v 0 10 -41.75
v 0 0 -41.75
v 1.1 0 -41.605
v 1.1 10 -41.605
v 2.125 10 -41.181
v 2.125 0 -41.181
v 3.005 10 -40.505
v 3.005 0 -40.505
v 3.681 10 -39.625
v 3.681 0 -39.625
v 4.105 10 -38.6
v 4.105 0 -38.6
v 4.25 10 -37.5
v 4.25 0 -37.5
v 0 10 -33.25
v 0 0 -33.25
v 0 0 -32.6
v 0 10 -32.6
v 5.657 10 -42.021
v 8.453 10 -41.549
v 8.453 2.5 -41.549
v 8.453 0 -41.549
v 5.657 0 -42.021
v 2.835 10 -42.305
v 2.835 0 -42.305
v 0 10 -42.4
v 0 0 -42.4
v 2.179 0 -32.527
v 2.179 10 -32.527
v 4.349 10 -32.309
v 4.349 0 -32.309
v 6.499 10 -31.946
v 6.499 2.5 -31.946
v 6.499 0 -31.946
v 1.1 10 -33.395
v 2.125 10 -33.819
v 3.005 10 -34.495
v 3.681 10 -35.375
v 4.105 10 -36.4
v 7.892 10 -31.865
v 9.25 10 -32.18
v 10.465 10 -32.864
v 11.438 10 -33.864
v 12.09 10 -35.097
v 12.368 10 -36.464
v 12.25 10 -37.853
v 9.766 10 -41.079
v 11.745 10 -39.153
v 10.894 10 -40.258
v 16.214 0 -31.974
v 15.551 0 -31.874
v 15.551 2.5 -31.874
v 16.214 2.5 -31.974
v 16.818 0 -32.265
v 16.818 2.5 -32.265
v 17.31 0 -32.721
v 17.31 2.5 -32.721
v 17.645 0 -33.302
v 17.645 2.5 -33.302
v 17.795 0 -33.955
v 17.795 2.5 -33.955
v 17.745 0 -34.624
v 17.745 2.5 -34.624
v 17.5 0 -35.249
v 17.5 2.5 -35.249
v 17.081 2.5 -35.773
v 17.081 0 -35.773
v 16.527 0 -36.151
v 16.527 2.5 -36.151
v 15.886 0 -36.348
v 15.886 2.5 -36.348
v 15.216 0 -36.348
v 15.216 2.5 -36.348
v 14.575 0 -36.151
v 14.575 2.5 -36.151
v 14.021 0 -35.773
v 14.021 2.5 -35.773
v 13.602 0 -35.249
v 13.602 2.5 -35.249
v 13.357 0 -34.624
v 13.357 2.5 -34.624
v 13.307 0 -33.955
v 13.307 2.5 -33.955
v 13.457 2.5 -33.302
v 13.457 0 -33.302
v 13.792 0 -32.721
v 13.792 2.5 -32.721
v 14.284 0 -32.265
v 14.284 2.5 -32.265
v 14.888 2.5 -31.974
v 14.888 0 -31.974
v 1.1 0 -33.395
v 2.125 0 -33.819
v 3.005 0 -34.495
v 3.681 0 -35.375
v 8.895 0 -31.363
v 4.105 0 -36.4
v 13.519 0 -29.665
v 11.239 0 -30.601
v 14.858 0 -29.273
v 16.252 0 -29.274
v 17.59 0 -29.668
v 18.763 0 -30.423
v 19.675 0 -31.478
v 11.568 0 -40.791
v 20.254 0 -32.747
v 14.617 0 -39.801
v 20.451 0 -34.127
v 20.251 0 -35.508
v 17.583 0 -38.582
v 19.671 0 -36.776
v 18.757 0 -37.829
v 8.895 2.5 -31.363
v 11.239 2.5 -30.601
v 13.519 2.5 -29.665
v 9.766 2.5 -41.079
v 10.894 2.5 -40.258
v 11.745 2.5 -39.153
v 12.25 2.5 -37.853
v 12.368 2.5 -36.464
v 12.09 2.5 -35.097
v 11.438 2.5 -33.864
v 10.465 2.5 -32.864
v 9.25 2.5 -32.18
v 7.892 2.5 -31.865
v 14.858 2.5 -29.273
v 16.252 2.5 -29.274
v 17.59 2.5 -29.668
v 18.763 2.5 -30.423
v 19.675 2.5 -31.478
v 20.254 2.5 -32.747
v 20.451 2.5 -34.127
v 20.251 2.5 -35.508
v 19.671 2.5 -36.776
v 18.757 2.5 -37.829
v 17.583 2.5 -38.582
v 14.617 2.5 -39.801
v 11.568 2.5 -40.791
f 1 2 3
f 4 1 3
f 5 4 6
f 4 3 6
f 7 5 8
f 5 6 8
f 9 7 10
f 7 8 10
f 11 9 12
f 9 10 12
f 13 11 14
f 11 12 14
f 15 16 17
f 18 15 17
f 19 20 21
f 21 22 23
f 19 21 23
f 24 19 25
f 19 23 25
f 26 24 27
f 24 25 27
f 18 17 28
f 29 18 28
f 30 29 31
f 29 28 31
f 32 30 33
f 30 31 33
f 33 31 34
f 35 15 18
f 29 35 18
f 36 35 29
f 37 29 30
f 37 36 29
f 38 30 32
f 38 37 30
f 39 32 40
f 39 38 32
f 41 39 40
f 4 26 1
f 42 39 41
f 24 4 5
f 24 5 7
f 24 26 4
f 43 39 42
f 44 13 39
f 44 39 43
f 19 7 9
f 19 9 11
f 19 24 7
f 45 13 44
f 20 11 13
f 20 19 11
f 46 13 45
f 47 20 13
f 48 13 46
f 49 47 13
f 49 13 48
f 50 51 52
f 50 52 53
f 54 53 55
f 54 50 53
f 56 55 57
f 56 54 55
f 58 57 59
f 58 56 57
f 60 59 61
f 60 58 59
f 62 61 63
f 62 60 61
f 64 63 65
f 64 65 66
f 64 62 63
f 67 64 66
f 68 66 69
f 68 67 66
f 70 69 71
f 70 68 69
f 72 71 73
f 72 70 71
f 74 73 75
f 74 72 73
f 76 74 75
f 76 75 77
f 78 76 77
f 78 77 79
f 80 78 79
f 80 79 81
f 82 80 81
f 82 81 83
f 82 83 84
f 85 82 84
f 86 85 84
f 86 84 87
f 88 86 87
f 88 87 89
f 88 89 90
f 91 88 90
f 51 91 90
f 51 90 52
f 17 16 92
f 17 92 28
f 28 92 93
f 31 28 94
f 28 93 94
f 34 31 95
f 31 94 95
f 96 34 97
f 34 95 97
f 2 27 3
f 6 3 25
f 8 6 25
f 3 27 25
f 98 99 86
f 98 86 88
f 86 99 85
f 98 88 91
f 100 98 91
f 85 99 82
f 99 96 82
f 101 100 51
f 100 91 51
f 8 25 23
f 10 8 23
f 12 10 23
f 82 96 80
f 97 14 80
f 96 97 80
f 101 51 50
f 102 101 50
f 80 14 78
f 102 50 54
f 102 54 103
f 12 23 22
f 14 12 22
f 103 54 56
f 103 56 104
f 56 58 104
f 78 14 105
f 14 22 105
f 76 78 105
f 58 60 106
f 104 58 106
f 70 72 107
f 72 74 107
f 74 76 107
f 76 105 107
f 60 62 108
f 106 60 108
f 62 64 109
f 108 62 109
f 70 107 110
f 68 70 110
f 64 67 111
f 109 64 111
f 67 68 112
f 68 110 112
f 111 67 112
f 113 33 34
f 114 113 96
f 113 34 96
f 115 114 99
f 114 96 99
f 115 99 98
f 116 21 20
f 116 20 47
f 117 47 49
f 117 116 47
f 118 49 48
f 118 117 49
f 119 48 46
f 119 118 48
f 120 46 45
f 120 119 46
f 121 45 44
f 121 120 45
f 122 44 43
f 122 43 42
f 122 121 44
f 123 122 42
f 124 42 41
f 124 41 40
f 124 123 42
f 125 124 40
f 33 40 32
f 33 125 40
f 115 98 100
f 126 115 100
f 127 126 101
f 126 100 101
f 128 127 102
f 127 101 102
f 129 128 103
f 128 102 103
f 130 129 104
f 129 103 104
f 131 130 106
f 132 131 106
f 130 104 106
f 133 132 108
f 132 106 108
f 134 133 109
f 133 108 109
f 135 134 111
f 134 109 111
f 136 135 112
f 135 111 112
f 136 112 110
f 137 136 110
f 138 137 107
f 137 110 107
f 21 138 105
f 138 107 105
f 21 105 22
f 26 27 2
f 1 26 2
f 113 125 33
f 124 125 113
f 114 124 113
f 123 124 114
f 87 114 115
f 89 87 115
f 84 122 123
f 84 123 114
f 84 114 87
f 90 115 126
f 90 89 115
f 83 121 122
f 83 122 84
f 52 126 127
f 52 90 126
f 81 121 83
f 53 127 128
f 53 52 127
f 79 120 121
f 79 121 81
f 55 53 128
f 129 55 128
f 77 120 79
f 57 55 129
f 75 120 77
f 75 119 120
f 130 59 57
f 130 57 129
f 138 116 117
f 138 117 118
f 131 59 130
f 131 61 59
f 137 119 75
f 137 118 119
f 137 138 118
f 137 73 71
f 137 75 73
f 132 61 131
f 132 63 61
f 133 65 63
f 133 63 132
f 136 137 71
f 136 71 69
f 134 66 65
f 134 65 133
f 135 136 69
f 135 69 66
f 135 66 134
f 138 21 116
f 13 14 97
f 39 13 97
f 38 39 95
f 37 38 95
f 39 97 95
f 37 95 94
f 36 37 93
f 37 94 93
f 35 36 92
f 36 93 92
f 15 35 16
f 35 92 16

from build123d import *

# Parameters (mm, degrees)
SKETCH_1_R          = 4.9
SKETCH_1_R_2        = 2.25
EXTRUDE_1_DEPTH     = 10
CUT_EXTRUDE_START   = -7.5
SKETCH_2_R          = 2.25
CUT_EXTRUDE_1_DEPTH = 7.5


with BuildPart() as part:
    # ｽｹｯﾁ1 → ﾎﾞｽ - 押し出し1 (new body)
    # profile 1 of 3: a face of its own
    with BuildSketch(Plane(origin=(0, 0, 0), x_dir=(1, 0, 0), z_dir=(0, 1, 0))):
        with BuildLine():
            Line((8.453200419, 41.548807476), (6.499394662, 31.945545371))
            ThreePointArc((6.499394662, 31.945545371), (10.073954086, 31.004442409), (13.518999843, 29.66473737))
            ThreePointArc((13.518999843, 29.66473737), (11.092186389, 36.155544584), (17.582993695, 38.582357791))
            ThreePointArc((17.582993695, 38.582357791), (13.102320669, 40.324796256), (8.453200419, 41.548807476))
        make_face()
    # profile 2 of 3: a face of its own
    with BuildSketch(Plane(origin=(0, 0, 0), x_dir=(1, 0, 0), z_dir=(0, 1, 0))):
        with Locations((15.5509966, 34.123547658)):
            Circle(SKETCH_1_R)
        with Locations(Location((15.5509966, 34.123547658, 0), (0, 0, 270))):
            Circle(SKETCH_1_R_2, mode=Mode.SUBTRACT)
    # profile 3 of 3: a face of its own
    with BuildSketch(Plane(origin=(0, 0, 0), x_dir=(1, 0, 0), z_dir=(0, 1, 0))):
        with BuildLine():
            Line((0, 33.25), (0, 32.6))
            ThreePointArc((0, 32.6), (3.266130809, 32.435973695), (6.499394662, 31.945545371))
            Line((6.499394662, 31.945545371), (8.453200419, 41.548807476))
            ThreePointArc((8.453200419, 41.548807476), (4.247973812, 42.186665174), (0, 42.4))
            Line((0, 42.4), (0, 41.75))
            ThreePointArc((0, 41.75), (3.00520382, 40.50520382), (4.25, 37.5))
            ThreePointArc((4.25, 37.5), (3.00520382, 34.49479618), (0, 33.25))
        make_face()
    extrude(amount=EXTRUDE_1_DEPTH)

    # ｽｹｯﾁ2 → ｶｯﾄ - 押し出し1 (cut)
    with BuildSketch(Plane(origin=(0, 10, 0), x_dir=(1, 0, 0), z_dir=(0, 1, 0)).offset(CUT_EXTRUDE_START)):
        with BuildLine():
            ThreePointArc((13.518999843, 29.66473737), (20.00980681, 32.091550732), (17.582993695, 38.582357791))
            ThreePointArc((17.582993695, 38.582357791), (13.102320689, 40.32479625), (8.453200459, 41.548807468))
            ThreePointArc((8.453200459, 41.548807468), (12.277928583, 35.770273495), (6.499394603, 31.945545383))
            ThreePointArc((6.499394603, 31.945545383), (10.073954057, 31.004442418), (13.518999843, 29.66473737))
        make_face()
        with Locations(Location((15.5509966, 34.123547658, 0), (0, 0, 270))):
            Circle(SKETCH_2_R, mode=Mode.SUBTRACT)
    extrude(amount=CUT_EXTRUDE_1_DEPTH, mode=Mode.SUBTRACT)


solid = part.part
